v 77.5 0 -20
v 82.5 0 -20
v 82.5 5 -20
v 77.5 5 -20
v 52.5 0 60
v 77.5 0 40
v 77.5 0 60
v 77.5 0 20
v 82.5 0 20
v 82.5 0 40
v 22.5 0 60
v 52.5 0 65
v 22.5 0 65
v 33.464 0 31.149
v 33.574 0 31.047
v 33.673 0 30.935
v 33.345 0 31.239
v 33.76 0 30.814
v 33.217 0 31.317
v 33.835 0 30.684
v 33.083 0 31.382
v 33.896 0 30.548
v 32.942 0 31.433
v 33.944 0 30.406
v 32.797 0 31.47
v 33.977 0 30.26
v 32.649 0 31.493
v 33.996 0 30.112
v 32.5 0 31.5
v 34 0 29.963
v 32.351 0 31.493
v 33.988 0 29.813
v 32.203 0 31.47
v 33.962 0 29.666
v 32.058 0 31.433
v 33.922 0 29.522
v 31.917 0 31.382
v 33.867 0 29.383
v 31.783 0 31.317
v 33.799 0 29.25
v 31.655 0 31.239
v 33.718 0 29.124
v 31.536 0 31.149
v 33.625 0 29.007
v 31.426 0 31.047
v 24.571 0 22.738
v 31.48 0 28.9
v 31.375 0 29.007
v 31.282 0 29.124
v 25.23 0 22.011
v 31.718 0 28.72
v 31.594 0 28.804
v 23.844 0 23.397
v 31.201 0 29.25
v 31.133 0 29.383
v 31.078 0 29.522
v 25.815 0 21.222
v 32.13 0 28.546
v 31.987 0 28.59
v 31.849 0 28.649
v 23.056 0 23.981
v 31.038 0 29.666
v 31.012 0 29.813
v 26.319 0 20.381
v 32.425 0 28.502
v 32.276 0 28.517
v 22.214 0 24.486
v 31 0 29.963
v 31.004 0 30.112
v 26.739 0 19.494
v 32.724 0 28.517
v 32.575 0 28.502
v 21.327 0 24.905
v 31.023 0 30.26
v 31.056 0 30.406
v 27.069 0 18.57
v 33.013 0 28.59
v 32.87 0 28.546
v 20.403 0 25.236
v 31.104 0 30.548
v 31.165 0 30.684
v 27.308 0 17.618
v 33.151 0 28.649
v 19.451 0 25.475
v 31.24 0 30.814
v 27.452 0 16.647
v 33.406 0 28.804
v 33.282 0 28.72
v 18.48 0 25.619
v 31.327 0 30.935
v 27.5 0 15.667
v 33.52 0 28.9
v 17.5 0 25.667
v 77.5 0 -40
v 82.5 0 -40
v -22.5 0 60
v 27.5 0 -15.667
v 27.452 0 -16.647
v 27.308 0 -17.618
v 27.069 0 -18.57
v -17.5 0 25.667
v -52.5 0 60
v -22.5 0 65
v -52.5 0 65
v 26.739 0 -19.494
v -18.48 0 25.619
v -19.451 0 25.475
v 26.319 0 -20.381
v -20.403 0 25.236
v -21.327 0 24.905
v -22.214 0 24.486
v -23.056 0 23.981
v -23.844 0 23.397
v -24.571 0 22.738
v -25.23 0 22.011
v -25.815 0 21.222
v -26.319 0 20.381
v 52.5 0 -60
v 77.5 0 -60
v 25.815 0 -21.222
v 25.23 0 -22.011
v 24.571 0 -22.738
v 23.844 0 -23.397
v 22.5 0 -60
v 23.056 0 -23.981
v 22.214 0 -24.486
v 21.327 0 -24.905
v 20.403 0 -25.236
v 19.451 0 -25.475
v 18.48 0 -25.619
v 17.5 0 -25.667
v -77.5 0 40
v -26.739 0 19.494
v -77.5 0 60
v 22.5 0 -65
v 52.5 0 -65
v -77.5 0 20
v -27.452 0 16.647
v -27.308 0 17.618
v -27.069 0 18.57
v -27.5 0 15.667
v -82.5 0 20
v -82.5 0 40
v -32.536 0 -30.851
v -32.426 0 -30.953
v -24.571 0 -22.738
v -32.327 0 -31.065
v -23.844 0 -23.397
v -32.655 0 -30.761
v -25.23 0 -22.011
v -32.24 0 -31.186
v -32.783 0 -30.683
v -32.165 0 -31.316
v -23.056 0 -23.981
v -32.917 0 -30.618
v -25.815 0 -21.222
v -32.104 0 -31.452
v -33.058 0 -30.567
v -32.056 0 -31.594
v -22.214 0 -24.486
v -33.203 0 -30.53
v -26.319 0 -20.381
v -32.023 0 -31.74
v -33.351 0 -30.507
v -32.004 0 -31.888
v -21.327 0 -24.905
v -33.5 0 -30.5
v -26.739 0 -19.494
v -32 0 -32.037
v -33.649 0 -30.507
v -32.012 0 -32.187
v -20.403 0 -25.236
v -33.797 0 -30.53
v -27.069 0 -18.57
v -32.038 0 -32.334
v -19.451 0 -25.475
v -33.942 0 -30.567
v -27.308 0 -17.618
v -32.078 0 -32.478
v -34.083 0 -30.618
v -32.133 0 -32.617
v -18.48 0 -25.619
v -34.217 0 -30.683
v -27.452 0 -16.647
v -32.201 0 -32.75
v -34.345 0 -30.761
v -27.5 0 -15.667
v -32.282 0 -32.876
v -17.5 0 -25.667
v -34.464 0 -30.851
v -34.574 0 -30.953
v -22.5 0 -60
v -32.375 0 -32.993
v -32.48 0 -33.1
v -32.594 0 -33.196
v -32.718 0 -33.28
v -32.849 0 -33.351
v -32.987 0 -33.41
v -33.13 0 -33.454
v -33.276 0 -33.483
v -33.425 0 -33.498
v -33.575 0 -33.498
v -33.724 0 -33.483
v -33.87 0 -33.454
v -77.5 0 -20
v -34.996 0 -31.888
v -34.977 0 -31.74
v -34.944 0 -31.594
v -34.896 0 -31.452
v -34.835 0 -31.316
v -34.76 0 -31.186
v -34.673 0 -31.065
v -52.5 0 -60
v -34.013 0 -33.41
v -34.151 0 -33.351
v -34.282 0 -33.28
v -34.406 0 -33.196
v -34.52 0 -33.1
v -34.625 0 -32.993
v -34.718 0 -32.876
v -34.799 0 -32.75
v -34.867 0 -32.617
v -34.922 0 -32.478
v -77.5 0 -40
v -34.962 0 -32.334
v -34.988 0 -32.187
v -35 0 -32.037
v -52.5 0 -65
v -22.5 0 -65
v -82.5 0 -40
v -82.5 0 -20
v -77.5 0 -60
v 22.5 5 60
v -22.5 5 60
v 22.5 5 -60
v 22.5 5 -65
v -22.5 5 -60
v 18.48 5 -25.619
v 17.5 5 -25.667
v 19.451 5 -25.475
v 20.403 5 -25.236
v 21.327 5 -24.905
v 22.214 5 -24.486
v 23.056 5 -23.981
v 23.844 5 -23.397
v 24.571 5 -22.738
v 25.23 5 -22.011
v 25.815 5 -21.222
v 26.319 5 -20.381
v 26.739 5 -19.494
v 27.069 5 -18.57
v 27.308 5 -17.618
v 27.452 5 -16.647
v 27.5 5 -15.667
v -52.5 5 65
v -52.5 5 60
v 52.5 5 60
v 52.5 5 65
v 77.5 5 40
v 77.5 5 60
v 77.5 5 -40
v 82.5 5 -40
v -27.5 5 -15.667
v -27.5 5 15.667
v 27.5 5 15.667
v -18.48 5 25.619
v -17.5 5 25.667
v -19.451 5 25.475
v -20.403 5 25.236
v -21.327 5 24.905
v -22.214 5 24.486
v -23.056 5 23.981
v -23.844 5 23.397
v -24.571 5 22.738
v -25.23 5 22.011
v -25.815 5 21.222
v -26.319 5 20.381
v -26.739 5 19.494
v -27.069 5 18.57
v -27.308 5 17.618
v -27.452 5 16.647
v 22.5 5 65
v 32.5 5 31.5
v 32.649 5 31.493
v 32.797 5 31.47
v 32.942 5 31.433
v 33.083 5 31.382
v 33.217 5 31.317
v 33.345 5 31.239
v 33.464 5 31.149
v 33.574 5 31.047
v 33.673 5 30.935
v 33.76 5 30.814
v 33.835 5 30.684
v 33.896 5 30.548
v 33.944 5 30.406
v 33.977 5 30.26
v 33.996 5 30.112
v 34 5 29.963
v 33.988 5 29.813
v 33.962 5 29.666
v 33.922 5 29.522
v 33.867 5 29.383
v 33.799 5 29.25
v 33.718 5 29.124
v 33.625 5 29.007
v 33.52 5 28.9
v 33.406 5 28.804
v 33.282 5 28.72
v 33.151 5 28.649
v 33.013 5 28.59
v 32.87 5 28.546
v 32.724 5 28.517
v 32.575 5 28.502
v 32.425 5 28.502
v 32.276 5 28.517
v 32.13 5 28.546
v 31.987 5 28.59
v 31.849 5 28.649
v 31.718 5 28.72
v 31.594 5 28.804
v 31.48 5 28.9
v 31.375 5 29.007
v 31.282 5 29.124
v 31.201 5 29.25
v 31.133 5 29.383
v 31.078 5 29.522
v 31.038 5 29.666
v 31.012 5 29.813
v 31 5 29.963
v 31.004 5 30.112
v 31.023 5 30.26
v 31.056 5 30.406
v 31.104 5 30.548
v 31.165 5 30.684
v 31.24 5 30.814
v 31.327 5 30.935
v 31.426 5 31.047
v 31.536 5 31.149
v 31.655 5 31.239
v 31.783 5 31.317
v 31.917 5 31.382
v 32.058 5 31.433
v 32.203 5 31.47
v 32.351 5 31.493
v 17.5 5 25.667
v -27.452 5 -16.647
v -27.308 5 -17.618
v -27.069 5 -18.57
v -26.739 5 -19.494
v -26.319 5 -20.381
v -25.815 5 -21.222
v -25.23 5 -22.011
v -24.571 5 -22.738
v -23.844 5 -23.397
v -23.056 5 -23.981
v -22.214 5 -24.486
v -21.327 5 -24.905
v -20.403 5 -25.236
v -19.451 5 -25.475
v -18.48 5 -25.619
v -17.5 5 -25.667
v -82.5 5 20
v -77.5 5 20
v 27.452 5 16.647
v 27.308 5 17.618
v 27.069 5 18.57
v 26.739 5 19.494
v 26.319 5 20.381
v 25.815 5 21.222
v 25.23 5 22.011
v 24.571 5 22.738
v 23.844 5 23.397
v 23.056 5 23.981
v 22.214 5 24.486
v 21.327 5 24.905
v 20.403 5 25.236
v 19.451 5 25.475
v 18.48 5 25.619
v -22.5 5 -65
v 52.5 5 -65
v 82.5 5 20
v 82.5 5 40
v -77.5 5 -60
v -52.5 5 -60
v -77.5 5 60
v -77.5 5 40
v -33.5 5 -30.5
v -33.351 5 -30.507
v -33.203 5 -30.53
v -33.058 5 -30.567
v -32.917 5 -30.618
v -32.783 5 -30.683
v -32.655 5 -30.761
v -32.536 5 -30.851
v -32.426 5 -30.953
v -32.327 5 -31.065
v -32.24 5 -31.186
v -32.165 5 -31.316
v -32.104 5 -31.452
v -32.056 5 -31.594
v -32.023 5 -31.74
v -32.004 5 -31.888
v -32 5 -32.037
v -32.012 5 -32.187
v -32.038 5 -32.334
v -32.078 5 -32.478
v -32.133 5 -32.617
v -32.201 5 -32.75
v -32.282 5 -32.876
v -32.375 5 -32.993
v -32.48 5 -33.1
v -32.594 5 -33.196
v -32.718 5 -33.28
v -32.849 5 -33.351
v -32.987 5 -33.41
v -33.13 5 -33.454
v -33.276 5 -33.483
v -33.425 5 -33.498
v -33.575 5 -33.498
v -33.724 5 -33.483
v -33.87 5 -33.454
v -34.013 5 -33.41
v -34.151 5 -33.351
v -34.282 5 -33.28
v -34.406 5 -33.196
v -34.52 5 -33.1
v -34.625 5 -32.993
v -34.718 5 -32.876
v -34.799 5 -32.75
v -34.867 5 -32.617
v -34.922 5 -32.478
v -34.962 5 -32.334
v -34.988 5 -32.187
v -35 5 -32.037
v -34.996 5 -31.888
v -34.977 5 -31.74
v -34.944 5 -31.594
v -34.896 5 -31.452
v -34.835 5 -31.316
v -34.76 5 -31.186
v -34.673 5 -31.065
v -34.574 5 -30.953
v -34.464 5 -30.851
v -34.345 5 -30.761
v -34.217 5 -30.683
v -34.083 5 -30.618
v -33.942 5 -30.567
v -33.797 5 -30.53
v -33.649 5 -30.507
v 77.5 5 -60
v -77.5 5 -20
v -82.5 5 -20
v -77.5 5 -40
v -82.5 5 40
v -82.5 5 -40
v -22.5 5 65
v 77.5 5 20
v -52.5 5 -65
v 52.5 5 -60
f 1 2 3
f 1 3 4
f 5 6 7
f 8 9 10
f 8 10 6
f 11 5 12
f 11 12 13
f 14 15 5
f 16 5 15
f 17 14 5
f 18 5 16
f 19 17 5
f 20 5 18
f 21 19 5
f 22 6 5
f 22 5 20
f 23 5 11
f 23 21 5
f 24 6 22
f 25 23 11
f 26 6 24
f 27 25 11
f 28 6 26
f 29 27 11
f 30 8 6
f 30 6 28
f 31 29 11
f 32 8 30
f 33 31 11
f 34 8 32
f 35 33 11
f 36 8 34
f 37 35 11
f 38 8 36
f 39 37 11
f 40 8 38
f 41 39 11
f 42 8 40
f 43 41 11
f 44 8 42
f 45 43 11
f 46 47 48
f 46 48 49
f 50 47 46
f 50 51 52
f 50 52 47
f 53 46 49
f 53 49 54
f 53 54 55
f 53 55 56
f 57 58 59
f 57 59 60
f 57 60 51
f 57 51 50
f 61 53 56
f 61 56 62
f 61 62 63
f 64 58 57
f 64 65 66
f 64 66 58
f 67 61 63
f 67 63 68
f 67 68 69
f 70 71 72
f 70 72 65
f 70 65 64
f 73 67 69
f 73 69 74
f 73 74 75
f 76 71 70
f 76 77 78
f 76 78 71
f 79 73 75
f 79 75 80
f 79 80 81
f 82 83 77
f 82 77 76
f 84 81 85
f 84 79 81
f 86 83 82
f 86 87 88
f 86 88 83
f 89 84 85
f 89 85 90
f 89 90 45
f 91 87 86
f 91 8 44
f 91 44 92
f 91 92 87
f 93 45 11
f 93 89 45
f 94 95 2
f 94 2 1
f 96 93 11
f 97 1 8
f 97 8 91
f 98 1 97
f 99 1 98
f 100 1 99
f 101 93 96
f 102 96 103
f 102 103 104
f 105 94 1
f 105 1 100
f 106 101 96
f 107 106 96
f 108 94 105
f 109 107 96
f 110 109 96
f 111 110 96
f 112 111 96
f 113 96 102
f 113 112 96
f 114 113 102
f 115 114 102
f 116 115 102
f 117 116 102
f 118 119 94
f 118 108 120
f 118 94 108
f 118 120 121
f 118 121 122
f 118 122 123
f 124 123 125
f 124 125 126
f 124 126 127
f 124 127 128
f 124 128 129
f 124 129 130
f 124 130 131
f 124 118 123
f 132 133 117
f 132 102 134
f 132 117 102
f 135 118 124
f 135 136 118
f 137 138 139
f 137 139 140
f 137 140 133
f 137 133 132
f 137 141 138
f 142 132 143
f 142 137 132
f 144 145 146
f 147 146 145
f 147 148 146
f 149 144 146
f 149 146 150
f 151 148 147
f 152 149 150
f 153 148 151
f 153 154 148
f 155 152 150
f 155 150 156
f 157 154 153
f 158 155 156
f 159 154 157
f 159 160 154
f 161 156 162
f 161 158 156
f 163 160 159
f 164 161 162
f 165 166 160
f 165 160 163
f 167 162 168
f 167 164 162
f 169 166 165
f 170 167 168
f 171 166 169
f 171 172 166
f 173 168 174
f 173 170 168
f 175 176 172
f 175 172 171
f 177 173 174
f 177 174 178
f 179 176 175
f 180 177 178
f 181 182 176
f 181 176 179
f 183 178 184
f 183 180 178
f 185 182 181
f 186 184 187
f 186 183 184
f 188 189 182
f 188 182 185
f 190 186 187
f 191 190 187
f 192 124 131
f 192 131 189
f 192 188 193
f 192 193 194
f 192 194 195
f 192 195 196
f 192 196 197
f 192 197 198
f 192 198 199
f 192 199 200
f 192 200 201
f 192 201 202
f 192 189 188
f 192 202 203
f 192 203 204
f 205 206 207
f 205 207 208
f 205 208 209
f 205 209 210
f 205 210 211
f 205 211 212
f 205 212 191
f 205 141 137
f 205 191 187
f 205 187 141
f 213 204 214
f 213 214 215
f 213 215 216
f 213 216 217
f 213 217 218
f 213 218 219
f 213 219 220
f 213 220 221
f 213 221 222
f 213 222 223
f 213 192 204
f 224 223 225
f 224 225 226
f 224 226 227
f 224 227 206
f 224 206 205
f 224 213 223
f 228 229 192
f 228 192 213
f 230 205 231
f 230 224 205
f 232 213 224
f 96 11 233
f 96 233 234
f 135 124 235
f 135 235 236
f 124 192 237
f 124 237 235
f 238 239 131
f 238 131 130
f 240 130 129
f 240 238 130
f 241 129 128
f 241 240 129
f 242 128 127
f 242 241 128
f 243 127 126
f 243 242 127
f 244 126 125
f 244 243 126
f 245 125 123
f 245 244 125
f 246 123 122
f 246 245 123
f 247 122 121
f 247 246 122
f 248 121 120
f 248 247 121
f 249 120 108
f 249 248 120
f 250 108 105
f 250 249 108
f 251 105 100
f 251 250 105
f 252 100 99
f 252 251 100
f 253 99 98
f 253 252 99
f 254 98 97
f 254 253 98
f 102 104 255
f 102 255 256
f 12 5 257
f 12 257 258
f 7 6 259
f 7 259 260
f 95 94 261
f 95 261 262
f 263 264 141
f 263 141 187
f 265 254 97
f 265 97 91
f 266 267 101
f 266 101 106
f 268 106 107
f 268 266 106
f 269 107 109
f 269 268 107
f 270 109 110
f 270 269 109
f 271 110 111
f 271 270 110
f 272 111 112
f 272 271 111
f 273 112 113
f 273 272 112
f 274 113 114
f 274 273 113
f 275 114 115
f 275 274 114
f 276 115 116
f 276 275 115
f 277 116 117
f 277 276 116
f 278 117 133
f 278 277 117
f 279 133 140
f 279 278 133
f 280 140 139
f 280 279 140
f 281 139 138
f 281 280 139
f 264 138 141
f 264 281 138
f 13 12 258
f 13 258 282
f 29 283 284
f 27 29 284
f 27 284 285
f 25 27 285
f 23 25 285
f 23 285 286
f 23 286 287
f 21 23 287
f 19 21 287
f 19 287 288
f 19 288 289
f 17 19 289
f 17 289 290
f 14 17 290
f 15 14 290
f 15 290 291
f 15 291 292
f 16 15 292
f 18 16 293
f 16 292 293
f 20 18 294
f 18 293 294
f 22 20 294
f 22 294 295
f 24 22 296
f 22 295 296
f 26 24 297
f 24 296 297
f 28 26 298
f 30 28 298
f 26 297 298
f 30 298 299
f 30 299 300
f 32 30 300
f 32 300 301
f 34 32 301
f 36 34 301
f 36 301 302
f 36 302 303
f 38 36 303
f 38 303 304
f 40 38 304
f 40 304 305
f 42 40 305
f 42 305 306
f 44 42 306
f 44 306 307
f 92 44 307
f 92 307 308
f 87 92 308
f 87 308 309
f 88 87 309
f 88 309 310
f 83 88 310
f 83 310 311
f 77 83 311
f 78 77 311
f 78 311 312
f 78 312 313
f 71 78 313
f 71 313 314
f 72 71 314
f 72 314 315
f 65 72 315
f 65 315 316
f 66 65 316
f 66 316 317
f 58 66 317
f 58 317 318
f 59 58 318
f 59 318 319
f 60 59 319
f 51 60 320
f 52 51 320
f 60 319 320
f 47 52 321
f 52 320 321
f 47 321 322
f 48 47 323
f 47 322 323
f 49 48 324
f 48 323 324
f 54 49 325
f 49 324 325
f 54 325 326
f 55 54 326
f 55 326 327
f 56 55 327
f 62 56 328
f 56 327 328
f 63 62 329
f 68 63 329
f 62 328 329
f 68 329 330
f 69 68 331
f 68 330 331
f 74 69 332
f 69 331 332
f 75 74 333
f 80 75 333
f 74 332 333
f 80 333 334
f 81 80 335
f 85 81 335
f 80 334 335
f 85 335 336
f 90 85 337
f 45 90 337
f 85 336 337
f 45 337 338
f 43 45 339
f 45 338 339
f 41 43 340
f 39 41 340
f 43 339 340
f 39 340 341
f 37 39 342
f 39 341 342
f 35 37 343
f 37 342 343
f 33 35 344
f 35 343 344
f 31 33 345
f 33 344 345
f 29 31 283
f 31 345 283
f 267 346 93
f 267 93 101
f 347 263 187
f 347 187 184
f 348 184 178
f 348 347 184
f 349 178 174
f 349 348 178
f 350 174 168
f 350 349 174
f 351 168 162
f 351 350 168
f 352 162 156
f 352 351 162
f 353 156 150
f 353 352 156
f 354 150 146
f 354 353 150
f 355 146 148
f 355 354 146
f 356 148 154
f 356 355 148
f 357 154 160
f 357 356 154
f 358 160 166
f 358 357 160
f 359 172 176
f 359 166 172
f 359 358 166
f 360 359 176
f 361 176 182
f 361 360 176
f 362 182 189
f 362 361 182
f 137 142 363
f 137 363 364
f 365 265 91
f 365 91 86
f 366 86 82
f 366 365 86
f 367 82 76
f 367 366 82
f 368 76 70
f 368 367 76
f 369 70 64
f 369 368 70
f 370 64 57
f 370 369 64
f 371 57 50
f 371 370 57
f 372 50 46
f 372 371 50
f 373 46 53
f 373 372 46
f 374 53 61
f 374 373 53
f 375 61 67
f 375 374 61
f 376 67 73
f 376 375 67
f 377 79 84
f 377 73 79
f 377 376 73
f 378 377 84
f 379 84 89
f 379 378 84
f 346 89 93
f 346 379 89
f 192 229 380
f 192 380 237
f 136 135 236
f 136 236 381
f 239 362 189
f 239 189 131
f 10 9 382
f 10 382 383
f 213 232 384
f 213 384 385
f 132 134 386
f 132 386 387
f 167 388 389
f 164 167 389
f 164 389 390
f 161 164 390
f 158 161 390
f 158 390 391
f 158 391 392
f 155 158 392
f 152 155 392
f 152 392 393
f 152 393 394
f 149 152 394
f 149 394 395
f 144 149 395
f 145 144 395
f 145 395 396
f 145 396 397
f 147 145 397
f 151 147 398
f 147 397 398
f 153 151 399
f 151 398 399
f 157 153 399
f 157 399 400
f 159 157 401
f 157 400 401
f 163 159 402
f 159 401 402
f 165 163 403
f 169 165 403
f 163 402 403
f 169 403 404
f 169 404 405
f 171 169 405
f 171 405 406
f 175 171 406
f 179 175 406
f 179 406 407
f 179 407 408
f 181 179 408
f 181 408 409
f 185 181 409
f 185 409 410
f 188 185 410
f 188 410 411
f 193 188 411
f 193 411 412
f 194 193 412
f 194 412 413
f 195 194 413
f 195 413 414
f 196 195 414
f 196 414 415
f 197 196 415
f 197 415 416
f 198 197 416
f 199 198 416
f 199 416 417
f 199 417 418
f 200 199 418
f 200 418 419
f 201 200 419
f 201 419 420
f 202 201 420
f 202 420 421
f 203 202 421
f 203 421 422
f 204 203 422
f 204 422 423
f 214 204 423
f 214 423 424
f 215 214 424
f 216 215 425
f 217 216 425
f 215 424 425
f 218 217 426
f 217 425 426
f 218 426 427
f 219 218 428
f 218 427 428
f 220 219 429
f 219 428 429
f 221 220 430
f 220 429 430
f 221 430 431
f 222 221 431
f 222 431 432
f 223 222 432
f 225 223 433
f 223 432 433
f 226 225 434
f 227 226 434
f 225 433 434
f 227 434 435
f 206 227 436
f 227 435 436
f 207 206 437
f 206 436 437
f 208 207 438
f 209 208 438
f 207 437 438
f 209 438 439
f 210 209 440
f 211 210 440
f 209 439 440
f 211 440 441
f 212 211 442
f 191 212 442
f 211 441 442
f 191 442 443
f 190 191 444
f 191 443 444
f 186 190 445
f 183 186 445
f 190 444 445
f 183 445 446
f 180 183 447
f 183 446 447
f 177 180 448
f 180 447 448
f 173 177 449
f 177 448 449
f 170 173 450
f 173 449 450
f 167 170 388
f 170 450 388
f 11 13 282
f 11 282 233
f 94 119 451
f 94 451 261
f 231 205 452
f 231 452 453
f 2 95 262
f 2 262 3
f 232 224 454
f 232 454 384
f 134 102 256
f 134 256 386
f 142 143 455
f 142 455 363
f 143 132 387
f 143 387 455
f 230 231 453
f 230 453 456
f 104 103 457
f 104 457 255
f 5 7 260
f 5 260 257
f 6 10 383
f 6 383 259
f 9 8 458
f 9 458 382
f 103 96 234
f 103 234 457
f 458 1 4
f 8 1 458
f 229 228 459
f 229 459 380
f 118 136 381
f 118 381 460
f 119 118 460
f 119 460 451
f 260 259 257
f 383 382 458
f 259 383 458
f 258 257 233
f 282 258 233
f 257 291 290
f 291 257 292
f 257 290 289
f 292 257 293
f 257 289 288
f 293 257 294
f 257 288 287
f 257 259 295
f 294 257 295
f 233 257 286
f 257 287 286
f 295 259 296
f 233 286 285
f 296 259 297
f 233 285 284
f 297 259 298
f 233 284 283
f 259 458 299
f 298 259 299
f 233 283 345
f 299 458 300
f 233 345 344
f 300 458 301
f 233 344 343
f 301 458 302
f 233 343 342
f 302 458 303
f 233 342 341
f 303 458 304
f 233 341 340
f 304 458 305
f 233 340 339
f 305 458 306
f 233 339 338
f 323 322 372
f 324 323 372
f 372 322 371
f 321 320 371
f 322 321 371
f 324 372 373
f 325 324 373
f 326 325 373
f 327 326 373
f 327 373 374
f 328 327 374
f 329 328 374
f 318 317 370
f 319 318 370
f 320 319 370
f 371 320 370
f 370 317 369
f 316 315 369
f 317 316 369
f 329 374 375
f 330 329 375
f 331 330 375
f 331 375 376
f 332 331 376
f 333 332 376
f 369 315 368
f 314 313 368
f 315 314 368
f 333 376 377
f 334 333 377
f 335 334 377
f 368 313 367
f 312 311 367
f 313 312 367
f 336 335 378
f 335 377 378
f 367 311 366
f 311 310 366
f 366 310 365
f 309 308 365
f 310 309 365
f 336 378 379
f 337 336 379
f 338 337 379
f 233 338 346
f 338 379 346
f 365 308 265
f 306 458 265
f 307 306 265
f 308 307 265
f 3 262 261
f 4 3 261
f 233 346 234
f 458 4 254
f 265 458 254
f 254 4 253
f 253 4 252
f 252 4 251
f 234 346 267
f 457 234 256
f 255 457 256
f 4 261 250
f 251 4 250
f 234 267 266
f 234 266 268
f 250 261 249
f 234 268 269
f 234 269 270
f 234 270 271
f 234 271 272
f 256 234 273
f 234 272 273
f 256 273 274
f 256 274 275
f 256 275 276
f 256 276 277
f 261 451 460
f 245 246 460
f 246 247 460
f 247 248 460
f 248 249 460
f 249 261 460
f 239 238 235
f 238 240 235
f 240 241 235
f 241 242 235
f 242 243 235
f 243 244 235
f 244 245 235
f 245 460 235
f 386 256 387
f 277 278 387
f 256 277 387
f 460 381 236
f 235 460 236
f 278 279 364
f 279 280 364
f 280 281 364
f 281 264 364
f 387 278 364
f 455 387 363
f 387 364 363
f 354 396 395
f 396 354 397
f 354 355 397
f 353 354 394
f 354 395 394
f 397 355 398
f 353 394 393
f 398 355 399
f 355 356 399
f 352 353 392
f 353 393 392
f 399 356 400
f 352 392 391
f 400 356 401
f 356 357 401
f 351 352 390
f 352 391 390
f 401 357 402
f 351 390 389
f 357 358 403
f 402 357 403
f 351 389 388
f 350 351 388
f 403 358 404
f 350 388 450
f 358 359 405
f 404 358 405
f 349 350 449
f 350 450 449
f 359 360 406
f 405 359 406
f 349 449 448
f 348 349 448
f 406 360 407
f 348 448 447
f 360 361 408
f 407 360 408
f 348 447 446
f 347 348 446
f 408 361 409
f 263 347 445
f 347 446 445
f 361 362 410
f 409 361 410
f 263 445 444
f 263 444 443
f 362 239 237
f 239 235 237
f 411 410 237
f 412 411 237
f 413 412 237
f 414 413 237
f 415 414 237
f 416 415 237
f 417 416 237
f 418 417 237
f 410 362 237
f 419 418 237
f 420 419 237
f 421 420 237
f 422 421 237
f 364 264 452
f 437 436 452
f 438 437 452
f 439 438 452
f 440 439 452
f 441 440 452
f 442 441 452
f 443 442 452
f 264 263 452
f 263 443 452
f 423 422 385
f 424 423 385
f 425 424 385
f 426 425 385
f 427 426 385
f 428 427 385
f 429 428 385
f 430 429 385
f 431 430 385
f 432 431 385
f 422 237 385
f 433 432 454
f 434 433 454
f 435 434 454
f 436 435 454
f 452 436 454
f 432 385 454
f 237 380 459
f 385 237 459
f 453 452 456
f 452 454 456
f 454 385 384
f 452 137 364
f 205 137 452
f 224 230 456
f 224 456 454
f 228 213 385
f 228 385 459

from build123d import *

# Parameters (mm, degrees)
BOSS_EXTRUDE1_DEPTH = 5
SKETCH3_R           = 1.5
CUT_EXTRUDE3_DEPTH  = 10


with BuildPart() as part:
    # Sketch1 → Boss-Extrude1 (new body)
    with BuildSketch(Plane(origin=(0, 0, 0), x_dir=(1, 0, 0), z_dir=(0, 1, 0))):
        Polygon((-77.5, 60), (-52.5, 60), (-52.5, 65), (-22.5, 65), (-22.5, 60), (22.5, 60), (22.5, 65), (52.5, 65), (52.5, 60), (77.5, 60), (77.5, 40), (82.5, 40), (82.5, 20), (77.5, 20), (77.5, -20), (82.5, -20), (82.5, -40), (77.5, -40), (77.5, -60), (52.5, -60), (52.5, -65), (22.5, -65), (22.5, -60), (-22.5, -60), (-22.5, -65), (-52.5, -65), (-52.5, -60), (-77.5, -60), (-77.5, -40), (-82.5, -40), (-82.5, -20), (-77.5, -20), (-77.5, 20), (-82.5, 20), (-82.5, 40), (-77.5, 40), align=None)
    extrude(amount=BOSS_EXTRUDE1_DEPTH)

    # Sketch3 → Cut-Extrude3 (cut)
    with BuildSketch(Plane(origin=(0, 5, 0), x_dir=(1, 0, 0), z_dir=(0, 1, 0))):
        with Locations(Location((-33.5, 32, 0), (0, 0, 270))):
            Circle(SKETCH3_R)
        with Locations(Location((32.5, -30, 0), (0, 0, 270))):
            Circle(SKETCH3_R)
        with BuildLine():
            Line((17.5, -25.666666667), (-17.5, -25.666666667))
            ThreePointArc((-17.5, -25.666666667), (-24.571067812, -22.737734479), (-27.5, -15.666666667))
            Line((-27.5, -15.666666667), (-27.5, 15.666666667))
            ThreePointArc((-27.5, 15.666666667), (-24.571067812, 22.737734479), (-17.5, 25.666666667))
            Line((-17.5, 25.666666667), (17.5, 25.666666667))
            ThreePointArc((17.5, 25.666666667), (24.571067812, 22.737734479), (27.5, 15.666666667))
            Line((27.5, 15.666666667), (27.5, -15.666666667))
            ThreePointArc((27.5, -15.666666667), (24.571067812, -22.737734479), (17.5, -25.666666667))
        make_face()
    extrude(amount=-CUT_EXTRUDE3_DEPTH, mode=Mode.SUBTRACT)


solid = part.part
